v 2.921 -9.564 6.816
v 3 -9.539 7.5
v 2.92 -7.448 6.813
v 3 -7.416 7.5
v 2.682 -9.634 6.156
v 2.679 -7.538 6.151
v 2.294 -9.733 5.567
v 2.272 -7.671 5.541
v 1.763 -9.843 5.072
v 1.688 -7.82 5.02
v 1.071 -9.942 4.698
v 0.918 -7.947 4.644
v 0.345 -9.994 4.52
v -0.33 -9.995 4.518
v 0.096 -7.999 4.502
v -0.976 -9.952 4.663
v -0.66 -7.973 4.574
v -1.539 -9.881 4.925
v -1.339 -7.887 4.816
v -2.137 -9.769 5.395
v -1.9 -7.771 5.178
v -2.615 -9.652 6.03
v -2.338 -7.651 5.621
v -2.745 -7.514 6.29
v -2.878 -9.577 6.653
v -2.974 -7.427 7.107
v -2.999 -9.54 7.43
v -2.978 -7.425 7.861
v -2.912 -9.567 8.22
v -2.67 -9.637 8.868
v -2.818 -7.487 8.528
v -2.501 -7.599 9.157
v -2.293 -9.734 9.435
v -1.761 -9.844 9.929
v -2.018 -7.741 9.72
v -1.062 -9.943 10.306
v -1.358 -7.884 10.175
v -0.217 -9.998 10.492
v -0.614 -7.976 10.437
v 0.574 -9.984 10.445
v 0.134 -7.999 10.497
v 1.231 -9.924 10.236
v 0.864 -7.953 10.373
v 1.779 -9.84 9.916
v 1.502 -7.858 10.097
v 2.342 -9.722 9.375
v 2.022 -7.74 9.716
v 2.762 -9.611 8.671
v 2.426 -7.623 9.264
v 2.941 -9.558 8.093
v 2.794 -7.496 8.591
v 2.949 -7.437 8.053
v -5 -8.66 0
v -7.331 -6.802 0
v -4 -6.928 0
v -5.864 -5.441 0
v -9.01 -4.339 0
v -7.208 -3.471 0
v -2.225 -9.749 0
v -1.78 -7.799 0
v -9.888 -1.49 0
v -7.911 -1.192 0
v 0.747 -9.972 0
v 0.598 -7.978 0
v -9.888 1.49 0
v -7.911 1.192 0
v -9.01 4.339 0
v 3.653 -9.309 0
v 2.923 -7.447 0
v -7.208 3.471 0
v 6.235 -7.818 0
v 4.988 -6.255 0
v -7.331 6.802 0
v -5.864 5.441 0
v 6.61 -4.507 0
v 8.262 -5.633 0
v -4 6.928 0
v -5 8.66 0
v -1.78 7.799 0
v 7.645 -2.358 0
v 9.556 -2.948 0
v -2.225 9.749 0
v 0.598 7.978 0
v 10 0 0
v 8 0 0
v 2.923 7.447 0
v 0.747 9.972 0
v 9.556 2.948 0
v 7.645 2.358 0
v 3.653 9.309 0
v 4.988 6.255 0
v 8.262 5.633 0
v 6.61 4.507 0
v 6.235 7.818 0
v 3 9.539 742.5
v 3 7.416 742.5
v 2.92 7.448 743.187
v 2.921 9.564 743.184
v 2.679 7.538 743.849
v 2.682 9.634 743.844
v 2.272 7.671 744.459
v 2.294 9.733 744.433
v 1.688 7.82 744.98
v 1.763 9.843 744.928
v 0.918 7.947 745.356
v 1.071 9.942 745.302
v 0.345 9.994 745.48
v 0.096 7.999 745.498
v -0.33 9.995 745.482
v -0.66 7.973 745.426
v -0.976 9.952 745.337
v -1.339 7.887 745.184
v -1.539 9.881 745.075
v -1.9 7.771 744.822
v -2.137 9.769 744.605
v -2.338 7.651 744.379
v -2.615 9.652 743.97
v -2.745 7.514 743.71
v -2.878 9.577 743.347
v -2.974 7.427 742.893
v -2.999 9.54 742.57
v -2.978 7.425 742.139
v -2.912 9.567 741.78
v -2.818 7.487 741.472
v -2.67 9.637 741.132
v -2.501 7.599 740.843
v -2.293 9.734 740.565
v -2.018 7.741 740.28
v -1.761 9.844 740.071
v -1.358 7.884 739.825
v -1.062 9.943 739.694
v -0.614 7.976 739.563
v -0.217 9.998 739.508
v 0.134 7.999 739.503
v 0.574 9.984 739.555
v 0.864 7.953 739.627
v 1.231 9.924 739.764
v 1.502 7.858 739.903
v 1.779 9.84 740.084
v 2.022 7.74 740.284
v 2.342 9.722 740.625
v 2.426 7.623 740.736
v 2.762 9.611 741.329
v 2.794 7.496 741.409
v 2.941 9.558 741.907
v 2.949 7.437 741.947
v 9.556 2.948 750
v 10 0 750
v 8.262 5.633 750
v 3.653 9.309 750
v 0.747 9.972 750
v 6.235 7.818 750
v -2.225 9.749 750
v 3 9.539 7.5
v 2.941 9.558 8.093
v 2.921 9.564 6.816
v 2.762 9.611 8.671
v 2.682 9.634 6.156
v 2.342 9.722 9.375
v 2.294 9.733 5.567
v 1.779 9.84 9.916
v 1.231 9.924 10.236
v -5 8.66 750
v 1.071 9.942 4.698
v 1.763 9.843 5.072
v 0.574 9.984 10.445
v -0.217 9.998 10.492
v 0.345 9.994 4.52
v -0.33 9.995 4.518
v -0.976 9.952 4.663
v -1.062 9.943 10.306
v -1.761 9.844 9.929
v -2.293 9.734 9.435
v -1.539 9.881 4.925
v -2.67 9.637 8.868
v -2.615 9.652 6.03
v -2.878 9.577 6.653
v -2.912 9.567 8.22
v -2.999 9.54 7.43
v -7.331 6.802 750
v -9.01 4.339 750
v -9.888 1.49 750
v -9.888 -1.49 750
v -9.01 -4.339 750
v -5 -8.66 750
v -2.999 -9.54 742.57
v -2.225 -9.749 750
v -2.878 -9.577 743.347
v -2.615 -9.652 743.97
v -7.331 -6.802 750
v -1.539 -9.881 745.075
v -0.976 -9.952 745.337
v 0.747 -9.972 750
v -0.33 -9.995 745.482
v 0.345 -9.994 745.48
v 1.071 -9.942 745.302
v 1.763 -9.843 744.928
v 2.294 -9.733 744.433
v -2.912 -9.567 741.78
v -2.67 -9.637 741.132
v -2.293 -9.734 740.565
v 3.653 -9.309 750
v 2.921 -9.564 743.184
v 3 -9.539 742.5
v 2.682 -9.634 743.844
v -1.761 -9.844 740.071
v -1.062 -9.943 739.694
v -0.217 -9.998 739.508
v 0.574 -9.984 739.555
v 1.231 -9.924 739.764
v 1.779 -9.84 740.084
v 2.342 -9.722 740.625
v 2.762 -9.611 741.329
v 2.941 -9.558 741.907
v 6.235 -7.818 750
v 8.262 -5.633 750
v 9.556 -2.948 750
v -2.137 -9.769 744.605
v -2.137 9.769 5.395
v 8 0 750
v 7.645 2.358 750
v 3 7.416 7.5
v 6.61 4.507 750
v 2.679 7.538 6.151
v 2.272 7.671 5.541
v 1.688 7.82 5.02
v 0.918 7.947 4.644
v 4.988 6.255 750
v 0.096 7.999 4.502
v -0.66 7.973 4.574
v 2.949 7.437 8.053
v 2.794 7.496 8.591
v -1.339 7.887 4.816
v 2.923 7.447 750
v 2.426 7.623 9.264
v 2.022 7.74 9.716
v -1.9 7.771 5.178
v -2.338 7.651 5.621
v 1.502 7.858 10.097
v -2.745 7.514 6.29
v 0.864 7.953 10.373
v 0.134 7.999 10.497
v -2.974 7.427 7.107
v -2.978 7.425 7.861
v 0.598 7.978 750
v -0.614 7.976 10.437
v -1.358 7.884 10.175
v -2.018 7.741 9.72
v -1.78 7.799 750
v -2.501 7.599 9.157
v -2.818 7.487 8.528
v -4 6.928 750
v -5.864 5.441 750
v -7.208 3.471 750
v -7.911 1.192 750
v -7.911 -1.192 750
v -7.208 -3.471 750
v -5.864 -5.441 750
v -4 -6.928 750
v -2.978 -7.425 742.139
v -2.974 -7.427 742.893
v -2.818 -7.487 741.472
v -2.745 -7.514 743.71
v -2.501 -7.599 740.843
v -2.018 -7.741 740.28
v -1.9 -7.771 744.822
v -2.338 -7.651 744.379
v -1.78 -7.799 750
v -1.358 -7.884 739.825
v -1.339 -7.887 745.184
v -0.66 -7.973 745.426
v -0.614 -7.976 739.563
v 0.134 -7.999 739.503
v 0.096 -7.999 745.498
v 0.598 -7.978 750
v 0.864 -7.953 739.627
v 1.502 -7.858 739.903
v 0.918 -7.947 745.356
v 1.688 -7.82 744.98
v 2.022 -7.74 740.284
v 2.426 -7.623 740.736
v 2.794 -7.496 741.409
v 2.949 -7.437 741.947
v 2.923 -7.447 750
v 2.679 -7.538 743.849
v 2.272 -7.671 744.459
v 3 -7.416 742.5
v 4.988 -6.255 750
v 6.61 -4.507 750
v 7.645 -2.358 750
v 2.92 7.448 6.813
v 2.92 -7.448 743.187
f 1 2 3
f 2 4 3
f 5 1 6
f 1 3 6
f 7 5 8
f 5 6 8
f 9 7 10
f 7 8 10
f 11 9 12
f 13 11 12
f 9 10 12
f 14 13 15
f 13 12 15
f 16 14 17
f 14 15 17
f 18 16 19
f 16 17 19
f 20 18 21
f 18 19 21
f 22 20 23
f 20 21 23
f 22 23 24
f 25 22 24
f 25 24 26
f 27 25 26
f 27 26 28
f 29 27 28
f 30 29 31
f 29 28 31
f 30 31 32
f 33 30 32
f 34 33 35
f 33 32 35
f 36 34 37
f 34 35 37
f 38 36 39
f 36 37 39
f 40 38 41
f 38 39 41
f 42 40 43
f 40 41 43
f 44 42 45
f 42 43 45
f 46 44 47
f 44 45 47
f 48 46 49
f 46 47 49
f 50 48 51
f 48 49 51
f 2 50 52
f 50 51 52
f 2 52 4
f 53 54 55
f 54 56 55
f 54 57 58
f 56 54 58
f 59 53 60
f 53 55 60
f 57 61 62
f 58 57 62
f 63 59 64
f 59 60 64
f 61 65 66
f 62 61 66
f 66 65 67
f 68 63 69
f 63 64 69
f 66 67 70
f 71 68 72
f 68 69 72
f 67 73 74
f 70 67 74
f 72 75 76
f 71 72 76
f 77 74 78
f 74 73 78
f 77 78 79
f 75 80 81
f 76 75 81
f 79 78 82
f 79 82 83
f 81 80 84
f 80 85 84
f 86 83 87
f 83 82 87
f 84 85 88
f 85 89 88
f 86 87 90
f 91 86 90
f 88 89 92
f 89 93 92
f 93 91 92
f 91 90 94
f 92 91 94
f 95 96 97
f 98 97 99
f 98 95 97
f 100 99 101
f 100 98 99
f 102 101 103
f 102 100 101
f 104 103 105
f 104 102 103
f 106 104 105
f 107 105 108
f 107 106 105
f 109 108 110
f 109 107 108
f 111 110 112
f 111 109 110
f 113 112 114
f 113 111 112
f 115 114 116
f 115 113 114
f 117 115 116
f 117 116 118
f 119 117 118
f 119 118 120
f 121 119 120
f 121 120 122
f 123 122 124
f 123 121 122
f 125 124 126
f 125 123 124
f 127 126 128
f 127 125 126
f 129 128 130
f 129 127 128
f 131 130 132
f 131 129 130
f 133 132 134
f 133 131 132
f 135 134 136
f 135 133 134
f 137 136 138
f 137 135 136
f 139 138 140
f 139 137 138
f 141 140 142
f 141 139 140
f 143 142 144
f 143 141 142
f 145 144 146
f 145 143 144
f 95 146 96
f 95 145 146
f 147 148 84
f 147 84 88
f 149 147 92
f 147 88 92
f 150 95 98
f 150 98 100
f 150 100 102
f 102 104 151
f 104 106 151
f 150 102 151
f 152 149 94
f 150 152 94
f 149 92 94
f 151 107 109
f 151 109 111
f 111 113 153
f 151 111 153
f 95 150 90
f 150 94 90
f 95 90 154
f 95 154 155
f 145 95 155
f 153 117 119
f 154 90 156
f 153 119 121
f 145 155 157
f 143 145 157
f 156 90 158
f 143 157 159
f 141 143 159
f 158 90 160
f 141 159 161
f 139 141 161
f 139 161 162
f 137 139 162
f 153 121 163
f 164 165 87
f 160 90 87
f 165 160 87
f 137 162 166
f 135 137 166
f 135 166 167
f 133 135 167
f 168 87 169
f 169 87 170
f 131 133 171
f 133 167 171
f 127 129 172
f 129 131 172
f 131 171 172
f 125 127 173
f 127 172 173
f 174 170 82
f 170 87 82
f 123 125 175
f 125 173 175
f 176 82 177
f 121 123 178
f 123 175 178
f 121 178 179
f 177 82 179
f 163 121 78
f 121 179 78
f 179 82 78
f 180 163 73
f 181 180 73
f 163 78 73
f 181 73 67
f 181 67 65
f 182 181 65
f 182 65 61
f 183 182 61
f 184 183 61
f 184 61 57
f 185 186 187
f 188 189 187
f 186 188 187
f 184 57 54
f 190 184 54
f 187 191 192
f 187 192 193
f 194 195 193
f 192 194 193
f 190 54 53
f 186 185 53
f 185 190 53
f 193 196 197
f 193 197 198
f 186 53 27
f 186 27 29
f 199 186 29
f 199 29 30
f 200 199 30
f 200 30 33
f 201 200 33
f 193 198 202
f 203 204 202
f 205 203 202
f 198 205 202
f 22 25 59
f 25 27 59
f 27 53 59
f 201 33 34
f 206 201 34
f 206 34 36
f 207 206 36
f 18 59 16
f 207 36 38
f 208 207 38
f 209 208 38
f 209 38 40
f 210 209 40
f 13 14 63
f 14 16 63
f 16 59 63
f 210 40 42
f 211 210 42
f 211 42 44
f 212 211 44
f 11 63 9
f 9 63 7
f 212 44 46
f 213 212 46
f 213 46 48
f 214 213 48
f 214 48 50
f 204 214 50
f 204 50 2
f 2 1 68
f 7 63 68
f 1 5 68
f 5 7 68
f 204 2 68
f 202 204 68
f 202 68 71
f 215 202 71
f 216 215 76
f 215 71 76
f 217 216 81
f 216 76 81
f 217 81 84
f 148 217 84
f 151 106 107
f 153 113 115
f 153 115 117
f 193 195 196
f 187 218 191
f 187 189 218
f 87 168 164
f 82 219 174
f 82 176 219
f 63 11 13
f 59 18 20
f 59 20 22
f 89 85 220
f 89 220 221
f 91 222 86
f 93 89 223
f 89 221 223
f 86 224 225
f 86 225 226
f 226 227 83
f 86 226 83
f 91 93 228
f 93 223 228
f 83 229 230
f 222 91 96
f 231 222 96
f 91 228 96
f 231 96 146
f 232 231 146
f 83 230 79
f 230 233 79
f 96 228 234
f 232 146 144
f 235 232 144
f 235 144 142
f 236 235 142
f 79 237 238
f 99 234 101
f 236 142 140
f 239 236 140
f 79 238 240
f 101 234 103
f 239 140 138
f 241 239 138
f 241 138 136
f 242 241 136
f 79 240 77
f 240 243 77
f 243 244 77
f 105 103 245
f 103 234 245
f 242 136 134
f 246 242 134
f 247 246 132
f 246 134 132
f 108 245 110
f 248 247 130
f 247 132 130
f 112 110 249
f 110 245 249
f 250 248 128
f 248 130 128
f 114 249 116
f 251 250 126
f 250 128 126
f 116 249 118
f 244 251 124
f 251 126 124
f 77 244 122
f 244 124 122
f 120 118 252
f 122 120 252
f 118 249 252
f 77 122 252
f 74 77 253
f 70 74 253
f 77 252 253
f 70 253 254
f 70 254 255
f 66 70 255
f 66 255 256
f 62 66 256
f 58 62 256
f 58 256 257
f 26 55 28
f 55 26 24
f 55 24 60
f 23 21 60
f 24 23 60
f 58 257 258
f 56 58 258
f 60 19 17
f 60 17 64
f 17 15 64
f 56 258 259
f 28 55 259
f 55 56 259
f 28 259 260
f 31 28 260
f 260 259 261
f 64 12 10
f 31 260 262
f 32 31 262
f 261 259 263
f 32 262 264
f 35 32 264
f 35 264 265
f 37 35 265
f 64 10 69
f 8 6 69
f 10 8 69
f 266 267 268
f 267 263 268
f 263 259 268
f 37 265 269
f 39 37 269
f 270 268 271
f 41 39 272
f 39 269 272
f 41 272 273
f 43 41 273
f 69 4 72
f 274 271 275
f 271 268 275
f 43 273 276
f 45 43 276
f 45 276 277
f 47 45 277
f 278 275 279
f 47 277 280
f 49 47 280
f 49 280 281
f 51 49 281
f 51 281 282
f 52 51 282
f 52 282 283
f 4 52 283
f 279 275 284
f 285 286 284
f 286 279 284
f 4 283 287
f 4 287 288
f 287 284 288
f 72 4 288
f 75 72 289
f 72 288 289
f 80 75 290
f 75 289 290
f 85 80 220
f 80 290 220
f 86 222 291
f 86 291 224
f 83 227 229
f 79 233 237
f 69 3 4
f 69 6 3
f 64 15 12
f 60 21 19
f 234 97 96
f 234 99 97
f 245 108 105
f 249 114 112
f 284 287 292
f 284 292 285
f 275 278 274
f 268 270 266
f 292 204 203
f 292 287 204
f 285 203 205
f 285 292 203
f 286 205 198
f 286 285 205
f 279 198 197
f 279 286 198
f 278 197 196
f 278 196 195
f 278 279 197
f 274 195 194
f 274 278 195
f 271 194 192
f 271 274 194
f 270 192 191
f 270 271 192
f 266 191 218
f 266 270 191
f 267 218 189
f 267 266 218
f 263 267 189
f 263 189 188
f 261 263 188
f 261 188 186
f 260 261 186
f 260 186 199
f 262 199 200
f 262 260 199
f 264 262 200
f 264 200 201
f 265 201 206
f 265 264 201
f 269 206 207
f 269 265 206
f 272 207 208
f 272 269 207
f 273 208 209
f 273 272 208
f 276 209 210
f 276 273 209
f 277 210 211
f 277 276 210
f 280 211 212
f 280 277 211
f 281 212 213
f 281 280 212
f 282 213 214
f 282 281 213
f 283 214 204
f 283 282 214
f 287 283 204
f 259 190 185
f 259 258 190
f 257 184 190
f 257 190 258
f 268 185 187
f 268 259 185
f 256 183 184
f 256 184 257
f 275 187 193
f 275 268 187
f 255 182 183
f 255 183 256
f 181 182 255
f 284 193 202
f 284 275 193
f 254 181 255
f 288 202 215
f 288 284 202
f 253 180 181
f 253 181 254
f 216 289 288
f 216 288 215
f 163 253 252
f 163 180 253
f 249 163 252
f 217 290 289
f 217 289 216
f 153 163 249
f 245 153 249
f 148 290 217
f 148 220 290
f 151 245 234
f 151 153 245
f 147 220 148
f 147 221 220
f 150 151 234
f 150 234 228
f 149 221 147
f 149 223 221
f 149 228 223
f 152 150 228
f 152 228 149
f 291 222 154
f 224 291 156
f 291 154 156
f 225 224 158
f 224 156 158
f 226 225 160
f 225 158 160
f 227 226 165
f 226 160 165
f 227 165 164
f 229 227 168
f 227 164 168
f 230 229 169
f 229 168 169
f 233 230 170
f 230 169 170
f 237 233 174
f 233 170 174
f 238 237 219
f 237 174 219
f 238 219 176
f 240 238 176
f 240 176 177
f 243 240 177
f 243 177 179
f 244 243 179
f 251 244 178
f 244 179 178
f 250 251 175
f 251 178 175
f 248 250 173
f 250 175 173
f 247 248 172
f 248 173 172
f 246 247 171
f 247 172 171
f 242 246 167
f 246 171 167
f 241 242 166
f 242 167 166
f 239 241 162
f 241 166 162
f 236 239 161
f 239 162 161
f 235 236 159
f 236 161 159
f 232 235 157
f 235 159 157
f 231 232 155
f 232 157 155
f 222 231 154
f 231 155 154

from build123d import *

# Parameters (mm, degrees)
SZKIC1_R                    = 10
DODANIE_WYCI_GNI_CIE2_DEPTH = 750
SZKIC3_R                    = 8
WYTNIJ_WYCI_GNI_CIE1_DEPTH  = 751
SZKIC4_R                    = 3
WYTNIJ_WYCI_GNI_CIE2_DEPTH  = 11


with BuildPart() as part:
    # Szkic1 → Dodanie-wyciągnięcie2 (new body)
    with BuildSketch(Plane.XY):
        Circle(SZKIC1_R)
    extrude(amount=DODANIE_WYCI_GNI_CIE2_DEPTH)

    # Szkic3 → Wytnij-wyciągnięcie1 (cut, through all)
    with BuildSketch(Plane.XY.offset(750)):
        Circle(SZKIC3_R)
    extrude(amount=-WYTNIJ_WYCI_GNI_CIE1_DEPTH, mode=Mode.SUBTRACT)

    # Szkic4 → Wytnij-wyciągnięcie2 (cut, symmetric)
    with BuildSketch(Plane(origin=(0, 0, 0), x_dir=(1, 0, 0), z_dir=(0, 1, 0))):
        with Locations((0, -7.5)):
            Circle(SZKIC4_R)
    wytnij_wyci_gni_cie2 = extrude(amount=WYTNIJ_WYCI_GNI_CIE2_DEPTH, both=True, mode=Mode.SUBTRACT)

    # Mirror1: Wytnij-wyciągnięcie2 across plane
    add(wytnij_wyci_gni_cie2.mirror(Plane.XY.offset(375)), mode=Mode.SUBTRACT)


solid = part.part
